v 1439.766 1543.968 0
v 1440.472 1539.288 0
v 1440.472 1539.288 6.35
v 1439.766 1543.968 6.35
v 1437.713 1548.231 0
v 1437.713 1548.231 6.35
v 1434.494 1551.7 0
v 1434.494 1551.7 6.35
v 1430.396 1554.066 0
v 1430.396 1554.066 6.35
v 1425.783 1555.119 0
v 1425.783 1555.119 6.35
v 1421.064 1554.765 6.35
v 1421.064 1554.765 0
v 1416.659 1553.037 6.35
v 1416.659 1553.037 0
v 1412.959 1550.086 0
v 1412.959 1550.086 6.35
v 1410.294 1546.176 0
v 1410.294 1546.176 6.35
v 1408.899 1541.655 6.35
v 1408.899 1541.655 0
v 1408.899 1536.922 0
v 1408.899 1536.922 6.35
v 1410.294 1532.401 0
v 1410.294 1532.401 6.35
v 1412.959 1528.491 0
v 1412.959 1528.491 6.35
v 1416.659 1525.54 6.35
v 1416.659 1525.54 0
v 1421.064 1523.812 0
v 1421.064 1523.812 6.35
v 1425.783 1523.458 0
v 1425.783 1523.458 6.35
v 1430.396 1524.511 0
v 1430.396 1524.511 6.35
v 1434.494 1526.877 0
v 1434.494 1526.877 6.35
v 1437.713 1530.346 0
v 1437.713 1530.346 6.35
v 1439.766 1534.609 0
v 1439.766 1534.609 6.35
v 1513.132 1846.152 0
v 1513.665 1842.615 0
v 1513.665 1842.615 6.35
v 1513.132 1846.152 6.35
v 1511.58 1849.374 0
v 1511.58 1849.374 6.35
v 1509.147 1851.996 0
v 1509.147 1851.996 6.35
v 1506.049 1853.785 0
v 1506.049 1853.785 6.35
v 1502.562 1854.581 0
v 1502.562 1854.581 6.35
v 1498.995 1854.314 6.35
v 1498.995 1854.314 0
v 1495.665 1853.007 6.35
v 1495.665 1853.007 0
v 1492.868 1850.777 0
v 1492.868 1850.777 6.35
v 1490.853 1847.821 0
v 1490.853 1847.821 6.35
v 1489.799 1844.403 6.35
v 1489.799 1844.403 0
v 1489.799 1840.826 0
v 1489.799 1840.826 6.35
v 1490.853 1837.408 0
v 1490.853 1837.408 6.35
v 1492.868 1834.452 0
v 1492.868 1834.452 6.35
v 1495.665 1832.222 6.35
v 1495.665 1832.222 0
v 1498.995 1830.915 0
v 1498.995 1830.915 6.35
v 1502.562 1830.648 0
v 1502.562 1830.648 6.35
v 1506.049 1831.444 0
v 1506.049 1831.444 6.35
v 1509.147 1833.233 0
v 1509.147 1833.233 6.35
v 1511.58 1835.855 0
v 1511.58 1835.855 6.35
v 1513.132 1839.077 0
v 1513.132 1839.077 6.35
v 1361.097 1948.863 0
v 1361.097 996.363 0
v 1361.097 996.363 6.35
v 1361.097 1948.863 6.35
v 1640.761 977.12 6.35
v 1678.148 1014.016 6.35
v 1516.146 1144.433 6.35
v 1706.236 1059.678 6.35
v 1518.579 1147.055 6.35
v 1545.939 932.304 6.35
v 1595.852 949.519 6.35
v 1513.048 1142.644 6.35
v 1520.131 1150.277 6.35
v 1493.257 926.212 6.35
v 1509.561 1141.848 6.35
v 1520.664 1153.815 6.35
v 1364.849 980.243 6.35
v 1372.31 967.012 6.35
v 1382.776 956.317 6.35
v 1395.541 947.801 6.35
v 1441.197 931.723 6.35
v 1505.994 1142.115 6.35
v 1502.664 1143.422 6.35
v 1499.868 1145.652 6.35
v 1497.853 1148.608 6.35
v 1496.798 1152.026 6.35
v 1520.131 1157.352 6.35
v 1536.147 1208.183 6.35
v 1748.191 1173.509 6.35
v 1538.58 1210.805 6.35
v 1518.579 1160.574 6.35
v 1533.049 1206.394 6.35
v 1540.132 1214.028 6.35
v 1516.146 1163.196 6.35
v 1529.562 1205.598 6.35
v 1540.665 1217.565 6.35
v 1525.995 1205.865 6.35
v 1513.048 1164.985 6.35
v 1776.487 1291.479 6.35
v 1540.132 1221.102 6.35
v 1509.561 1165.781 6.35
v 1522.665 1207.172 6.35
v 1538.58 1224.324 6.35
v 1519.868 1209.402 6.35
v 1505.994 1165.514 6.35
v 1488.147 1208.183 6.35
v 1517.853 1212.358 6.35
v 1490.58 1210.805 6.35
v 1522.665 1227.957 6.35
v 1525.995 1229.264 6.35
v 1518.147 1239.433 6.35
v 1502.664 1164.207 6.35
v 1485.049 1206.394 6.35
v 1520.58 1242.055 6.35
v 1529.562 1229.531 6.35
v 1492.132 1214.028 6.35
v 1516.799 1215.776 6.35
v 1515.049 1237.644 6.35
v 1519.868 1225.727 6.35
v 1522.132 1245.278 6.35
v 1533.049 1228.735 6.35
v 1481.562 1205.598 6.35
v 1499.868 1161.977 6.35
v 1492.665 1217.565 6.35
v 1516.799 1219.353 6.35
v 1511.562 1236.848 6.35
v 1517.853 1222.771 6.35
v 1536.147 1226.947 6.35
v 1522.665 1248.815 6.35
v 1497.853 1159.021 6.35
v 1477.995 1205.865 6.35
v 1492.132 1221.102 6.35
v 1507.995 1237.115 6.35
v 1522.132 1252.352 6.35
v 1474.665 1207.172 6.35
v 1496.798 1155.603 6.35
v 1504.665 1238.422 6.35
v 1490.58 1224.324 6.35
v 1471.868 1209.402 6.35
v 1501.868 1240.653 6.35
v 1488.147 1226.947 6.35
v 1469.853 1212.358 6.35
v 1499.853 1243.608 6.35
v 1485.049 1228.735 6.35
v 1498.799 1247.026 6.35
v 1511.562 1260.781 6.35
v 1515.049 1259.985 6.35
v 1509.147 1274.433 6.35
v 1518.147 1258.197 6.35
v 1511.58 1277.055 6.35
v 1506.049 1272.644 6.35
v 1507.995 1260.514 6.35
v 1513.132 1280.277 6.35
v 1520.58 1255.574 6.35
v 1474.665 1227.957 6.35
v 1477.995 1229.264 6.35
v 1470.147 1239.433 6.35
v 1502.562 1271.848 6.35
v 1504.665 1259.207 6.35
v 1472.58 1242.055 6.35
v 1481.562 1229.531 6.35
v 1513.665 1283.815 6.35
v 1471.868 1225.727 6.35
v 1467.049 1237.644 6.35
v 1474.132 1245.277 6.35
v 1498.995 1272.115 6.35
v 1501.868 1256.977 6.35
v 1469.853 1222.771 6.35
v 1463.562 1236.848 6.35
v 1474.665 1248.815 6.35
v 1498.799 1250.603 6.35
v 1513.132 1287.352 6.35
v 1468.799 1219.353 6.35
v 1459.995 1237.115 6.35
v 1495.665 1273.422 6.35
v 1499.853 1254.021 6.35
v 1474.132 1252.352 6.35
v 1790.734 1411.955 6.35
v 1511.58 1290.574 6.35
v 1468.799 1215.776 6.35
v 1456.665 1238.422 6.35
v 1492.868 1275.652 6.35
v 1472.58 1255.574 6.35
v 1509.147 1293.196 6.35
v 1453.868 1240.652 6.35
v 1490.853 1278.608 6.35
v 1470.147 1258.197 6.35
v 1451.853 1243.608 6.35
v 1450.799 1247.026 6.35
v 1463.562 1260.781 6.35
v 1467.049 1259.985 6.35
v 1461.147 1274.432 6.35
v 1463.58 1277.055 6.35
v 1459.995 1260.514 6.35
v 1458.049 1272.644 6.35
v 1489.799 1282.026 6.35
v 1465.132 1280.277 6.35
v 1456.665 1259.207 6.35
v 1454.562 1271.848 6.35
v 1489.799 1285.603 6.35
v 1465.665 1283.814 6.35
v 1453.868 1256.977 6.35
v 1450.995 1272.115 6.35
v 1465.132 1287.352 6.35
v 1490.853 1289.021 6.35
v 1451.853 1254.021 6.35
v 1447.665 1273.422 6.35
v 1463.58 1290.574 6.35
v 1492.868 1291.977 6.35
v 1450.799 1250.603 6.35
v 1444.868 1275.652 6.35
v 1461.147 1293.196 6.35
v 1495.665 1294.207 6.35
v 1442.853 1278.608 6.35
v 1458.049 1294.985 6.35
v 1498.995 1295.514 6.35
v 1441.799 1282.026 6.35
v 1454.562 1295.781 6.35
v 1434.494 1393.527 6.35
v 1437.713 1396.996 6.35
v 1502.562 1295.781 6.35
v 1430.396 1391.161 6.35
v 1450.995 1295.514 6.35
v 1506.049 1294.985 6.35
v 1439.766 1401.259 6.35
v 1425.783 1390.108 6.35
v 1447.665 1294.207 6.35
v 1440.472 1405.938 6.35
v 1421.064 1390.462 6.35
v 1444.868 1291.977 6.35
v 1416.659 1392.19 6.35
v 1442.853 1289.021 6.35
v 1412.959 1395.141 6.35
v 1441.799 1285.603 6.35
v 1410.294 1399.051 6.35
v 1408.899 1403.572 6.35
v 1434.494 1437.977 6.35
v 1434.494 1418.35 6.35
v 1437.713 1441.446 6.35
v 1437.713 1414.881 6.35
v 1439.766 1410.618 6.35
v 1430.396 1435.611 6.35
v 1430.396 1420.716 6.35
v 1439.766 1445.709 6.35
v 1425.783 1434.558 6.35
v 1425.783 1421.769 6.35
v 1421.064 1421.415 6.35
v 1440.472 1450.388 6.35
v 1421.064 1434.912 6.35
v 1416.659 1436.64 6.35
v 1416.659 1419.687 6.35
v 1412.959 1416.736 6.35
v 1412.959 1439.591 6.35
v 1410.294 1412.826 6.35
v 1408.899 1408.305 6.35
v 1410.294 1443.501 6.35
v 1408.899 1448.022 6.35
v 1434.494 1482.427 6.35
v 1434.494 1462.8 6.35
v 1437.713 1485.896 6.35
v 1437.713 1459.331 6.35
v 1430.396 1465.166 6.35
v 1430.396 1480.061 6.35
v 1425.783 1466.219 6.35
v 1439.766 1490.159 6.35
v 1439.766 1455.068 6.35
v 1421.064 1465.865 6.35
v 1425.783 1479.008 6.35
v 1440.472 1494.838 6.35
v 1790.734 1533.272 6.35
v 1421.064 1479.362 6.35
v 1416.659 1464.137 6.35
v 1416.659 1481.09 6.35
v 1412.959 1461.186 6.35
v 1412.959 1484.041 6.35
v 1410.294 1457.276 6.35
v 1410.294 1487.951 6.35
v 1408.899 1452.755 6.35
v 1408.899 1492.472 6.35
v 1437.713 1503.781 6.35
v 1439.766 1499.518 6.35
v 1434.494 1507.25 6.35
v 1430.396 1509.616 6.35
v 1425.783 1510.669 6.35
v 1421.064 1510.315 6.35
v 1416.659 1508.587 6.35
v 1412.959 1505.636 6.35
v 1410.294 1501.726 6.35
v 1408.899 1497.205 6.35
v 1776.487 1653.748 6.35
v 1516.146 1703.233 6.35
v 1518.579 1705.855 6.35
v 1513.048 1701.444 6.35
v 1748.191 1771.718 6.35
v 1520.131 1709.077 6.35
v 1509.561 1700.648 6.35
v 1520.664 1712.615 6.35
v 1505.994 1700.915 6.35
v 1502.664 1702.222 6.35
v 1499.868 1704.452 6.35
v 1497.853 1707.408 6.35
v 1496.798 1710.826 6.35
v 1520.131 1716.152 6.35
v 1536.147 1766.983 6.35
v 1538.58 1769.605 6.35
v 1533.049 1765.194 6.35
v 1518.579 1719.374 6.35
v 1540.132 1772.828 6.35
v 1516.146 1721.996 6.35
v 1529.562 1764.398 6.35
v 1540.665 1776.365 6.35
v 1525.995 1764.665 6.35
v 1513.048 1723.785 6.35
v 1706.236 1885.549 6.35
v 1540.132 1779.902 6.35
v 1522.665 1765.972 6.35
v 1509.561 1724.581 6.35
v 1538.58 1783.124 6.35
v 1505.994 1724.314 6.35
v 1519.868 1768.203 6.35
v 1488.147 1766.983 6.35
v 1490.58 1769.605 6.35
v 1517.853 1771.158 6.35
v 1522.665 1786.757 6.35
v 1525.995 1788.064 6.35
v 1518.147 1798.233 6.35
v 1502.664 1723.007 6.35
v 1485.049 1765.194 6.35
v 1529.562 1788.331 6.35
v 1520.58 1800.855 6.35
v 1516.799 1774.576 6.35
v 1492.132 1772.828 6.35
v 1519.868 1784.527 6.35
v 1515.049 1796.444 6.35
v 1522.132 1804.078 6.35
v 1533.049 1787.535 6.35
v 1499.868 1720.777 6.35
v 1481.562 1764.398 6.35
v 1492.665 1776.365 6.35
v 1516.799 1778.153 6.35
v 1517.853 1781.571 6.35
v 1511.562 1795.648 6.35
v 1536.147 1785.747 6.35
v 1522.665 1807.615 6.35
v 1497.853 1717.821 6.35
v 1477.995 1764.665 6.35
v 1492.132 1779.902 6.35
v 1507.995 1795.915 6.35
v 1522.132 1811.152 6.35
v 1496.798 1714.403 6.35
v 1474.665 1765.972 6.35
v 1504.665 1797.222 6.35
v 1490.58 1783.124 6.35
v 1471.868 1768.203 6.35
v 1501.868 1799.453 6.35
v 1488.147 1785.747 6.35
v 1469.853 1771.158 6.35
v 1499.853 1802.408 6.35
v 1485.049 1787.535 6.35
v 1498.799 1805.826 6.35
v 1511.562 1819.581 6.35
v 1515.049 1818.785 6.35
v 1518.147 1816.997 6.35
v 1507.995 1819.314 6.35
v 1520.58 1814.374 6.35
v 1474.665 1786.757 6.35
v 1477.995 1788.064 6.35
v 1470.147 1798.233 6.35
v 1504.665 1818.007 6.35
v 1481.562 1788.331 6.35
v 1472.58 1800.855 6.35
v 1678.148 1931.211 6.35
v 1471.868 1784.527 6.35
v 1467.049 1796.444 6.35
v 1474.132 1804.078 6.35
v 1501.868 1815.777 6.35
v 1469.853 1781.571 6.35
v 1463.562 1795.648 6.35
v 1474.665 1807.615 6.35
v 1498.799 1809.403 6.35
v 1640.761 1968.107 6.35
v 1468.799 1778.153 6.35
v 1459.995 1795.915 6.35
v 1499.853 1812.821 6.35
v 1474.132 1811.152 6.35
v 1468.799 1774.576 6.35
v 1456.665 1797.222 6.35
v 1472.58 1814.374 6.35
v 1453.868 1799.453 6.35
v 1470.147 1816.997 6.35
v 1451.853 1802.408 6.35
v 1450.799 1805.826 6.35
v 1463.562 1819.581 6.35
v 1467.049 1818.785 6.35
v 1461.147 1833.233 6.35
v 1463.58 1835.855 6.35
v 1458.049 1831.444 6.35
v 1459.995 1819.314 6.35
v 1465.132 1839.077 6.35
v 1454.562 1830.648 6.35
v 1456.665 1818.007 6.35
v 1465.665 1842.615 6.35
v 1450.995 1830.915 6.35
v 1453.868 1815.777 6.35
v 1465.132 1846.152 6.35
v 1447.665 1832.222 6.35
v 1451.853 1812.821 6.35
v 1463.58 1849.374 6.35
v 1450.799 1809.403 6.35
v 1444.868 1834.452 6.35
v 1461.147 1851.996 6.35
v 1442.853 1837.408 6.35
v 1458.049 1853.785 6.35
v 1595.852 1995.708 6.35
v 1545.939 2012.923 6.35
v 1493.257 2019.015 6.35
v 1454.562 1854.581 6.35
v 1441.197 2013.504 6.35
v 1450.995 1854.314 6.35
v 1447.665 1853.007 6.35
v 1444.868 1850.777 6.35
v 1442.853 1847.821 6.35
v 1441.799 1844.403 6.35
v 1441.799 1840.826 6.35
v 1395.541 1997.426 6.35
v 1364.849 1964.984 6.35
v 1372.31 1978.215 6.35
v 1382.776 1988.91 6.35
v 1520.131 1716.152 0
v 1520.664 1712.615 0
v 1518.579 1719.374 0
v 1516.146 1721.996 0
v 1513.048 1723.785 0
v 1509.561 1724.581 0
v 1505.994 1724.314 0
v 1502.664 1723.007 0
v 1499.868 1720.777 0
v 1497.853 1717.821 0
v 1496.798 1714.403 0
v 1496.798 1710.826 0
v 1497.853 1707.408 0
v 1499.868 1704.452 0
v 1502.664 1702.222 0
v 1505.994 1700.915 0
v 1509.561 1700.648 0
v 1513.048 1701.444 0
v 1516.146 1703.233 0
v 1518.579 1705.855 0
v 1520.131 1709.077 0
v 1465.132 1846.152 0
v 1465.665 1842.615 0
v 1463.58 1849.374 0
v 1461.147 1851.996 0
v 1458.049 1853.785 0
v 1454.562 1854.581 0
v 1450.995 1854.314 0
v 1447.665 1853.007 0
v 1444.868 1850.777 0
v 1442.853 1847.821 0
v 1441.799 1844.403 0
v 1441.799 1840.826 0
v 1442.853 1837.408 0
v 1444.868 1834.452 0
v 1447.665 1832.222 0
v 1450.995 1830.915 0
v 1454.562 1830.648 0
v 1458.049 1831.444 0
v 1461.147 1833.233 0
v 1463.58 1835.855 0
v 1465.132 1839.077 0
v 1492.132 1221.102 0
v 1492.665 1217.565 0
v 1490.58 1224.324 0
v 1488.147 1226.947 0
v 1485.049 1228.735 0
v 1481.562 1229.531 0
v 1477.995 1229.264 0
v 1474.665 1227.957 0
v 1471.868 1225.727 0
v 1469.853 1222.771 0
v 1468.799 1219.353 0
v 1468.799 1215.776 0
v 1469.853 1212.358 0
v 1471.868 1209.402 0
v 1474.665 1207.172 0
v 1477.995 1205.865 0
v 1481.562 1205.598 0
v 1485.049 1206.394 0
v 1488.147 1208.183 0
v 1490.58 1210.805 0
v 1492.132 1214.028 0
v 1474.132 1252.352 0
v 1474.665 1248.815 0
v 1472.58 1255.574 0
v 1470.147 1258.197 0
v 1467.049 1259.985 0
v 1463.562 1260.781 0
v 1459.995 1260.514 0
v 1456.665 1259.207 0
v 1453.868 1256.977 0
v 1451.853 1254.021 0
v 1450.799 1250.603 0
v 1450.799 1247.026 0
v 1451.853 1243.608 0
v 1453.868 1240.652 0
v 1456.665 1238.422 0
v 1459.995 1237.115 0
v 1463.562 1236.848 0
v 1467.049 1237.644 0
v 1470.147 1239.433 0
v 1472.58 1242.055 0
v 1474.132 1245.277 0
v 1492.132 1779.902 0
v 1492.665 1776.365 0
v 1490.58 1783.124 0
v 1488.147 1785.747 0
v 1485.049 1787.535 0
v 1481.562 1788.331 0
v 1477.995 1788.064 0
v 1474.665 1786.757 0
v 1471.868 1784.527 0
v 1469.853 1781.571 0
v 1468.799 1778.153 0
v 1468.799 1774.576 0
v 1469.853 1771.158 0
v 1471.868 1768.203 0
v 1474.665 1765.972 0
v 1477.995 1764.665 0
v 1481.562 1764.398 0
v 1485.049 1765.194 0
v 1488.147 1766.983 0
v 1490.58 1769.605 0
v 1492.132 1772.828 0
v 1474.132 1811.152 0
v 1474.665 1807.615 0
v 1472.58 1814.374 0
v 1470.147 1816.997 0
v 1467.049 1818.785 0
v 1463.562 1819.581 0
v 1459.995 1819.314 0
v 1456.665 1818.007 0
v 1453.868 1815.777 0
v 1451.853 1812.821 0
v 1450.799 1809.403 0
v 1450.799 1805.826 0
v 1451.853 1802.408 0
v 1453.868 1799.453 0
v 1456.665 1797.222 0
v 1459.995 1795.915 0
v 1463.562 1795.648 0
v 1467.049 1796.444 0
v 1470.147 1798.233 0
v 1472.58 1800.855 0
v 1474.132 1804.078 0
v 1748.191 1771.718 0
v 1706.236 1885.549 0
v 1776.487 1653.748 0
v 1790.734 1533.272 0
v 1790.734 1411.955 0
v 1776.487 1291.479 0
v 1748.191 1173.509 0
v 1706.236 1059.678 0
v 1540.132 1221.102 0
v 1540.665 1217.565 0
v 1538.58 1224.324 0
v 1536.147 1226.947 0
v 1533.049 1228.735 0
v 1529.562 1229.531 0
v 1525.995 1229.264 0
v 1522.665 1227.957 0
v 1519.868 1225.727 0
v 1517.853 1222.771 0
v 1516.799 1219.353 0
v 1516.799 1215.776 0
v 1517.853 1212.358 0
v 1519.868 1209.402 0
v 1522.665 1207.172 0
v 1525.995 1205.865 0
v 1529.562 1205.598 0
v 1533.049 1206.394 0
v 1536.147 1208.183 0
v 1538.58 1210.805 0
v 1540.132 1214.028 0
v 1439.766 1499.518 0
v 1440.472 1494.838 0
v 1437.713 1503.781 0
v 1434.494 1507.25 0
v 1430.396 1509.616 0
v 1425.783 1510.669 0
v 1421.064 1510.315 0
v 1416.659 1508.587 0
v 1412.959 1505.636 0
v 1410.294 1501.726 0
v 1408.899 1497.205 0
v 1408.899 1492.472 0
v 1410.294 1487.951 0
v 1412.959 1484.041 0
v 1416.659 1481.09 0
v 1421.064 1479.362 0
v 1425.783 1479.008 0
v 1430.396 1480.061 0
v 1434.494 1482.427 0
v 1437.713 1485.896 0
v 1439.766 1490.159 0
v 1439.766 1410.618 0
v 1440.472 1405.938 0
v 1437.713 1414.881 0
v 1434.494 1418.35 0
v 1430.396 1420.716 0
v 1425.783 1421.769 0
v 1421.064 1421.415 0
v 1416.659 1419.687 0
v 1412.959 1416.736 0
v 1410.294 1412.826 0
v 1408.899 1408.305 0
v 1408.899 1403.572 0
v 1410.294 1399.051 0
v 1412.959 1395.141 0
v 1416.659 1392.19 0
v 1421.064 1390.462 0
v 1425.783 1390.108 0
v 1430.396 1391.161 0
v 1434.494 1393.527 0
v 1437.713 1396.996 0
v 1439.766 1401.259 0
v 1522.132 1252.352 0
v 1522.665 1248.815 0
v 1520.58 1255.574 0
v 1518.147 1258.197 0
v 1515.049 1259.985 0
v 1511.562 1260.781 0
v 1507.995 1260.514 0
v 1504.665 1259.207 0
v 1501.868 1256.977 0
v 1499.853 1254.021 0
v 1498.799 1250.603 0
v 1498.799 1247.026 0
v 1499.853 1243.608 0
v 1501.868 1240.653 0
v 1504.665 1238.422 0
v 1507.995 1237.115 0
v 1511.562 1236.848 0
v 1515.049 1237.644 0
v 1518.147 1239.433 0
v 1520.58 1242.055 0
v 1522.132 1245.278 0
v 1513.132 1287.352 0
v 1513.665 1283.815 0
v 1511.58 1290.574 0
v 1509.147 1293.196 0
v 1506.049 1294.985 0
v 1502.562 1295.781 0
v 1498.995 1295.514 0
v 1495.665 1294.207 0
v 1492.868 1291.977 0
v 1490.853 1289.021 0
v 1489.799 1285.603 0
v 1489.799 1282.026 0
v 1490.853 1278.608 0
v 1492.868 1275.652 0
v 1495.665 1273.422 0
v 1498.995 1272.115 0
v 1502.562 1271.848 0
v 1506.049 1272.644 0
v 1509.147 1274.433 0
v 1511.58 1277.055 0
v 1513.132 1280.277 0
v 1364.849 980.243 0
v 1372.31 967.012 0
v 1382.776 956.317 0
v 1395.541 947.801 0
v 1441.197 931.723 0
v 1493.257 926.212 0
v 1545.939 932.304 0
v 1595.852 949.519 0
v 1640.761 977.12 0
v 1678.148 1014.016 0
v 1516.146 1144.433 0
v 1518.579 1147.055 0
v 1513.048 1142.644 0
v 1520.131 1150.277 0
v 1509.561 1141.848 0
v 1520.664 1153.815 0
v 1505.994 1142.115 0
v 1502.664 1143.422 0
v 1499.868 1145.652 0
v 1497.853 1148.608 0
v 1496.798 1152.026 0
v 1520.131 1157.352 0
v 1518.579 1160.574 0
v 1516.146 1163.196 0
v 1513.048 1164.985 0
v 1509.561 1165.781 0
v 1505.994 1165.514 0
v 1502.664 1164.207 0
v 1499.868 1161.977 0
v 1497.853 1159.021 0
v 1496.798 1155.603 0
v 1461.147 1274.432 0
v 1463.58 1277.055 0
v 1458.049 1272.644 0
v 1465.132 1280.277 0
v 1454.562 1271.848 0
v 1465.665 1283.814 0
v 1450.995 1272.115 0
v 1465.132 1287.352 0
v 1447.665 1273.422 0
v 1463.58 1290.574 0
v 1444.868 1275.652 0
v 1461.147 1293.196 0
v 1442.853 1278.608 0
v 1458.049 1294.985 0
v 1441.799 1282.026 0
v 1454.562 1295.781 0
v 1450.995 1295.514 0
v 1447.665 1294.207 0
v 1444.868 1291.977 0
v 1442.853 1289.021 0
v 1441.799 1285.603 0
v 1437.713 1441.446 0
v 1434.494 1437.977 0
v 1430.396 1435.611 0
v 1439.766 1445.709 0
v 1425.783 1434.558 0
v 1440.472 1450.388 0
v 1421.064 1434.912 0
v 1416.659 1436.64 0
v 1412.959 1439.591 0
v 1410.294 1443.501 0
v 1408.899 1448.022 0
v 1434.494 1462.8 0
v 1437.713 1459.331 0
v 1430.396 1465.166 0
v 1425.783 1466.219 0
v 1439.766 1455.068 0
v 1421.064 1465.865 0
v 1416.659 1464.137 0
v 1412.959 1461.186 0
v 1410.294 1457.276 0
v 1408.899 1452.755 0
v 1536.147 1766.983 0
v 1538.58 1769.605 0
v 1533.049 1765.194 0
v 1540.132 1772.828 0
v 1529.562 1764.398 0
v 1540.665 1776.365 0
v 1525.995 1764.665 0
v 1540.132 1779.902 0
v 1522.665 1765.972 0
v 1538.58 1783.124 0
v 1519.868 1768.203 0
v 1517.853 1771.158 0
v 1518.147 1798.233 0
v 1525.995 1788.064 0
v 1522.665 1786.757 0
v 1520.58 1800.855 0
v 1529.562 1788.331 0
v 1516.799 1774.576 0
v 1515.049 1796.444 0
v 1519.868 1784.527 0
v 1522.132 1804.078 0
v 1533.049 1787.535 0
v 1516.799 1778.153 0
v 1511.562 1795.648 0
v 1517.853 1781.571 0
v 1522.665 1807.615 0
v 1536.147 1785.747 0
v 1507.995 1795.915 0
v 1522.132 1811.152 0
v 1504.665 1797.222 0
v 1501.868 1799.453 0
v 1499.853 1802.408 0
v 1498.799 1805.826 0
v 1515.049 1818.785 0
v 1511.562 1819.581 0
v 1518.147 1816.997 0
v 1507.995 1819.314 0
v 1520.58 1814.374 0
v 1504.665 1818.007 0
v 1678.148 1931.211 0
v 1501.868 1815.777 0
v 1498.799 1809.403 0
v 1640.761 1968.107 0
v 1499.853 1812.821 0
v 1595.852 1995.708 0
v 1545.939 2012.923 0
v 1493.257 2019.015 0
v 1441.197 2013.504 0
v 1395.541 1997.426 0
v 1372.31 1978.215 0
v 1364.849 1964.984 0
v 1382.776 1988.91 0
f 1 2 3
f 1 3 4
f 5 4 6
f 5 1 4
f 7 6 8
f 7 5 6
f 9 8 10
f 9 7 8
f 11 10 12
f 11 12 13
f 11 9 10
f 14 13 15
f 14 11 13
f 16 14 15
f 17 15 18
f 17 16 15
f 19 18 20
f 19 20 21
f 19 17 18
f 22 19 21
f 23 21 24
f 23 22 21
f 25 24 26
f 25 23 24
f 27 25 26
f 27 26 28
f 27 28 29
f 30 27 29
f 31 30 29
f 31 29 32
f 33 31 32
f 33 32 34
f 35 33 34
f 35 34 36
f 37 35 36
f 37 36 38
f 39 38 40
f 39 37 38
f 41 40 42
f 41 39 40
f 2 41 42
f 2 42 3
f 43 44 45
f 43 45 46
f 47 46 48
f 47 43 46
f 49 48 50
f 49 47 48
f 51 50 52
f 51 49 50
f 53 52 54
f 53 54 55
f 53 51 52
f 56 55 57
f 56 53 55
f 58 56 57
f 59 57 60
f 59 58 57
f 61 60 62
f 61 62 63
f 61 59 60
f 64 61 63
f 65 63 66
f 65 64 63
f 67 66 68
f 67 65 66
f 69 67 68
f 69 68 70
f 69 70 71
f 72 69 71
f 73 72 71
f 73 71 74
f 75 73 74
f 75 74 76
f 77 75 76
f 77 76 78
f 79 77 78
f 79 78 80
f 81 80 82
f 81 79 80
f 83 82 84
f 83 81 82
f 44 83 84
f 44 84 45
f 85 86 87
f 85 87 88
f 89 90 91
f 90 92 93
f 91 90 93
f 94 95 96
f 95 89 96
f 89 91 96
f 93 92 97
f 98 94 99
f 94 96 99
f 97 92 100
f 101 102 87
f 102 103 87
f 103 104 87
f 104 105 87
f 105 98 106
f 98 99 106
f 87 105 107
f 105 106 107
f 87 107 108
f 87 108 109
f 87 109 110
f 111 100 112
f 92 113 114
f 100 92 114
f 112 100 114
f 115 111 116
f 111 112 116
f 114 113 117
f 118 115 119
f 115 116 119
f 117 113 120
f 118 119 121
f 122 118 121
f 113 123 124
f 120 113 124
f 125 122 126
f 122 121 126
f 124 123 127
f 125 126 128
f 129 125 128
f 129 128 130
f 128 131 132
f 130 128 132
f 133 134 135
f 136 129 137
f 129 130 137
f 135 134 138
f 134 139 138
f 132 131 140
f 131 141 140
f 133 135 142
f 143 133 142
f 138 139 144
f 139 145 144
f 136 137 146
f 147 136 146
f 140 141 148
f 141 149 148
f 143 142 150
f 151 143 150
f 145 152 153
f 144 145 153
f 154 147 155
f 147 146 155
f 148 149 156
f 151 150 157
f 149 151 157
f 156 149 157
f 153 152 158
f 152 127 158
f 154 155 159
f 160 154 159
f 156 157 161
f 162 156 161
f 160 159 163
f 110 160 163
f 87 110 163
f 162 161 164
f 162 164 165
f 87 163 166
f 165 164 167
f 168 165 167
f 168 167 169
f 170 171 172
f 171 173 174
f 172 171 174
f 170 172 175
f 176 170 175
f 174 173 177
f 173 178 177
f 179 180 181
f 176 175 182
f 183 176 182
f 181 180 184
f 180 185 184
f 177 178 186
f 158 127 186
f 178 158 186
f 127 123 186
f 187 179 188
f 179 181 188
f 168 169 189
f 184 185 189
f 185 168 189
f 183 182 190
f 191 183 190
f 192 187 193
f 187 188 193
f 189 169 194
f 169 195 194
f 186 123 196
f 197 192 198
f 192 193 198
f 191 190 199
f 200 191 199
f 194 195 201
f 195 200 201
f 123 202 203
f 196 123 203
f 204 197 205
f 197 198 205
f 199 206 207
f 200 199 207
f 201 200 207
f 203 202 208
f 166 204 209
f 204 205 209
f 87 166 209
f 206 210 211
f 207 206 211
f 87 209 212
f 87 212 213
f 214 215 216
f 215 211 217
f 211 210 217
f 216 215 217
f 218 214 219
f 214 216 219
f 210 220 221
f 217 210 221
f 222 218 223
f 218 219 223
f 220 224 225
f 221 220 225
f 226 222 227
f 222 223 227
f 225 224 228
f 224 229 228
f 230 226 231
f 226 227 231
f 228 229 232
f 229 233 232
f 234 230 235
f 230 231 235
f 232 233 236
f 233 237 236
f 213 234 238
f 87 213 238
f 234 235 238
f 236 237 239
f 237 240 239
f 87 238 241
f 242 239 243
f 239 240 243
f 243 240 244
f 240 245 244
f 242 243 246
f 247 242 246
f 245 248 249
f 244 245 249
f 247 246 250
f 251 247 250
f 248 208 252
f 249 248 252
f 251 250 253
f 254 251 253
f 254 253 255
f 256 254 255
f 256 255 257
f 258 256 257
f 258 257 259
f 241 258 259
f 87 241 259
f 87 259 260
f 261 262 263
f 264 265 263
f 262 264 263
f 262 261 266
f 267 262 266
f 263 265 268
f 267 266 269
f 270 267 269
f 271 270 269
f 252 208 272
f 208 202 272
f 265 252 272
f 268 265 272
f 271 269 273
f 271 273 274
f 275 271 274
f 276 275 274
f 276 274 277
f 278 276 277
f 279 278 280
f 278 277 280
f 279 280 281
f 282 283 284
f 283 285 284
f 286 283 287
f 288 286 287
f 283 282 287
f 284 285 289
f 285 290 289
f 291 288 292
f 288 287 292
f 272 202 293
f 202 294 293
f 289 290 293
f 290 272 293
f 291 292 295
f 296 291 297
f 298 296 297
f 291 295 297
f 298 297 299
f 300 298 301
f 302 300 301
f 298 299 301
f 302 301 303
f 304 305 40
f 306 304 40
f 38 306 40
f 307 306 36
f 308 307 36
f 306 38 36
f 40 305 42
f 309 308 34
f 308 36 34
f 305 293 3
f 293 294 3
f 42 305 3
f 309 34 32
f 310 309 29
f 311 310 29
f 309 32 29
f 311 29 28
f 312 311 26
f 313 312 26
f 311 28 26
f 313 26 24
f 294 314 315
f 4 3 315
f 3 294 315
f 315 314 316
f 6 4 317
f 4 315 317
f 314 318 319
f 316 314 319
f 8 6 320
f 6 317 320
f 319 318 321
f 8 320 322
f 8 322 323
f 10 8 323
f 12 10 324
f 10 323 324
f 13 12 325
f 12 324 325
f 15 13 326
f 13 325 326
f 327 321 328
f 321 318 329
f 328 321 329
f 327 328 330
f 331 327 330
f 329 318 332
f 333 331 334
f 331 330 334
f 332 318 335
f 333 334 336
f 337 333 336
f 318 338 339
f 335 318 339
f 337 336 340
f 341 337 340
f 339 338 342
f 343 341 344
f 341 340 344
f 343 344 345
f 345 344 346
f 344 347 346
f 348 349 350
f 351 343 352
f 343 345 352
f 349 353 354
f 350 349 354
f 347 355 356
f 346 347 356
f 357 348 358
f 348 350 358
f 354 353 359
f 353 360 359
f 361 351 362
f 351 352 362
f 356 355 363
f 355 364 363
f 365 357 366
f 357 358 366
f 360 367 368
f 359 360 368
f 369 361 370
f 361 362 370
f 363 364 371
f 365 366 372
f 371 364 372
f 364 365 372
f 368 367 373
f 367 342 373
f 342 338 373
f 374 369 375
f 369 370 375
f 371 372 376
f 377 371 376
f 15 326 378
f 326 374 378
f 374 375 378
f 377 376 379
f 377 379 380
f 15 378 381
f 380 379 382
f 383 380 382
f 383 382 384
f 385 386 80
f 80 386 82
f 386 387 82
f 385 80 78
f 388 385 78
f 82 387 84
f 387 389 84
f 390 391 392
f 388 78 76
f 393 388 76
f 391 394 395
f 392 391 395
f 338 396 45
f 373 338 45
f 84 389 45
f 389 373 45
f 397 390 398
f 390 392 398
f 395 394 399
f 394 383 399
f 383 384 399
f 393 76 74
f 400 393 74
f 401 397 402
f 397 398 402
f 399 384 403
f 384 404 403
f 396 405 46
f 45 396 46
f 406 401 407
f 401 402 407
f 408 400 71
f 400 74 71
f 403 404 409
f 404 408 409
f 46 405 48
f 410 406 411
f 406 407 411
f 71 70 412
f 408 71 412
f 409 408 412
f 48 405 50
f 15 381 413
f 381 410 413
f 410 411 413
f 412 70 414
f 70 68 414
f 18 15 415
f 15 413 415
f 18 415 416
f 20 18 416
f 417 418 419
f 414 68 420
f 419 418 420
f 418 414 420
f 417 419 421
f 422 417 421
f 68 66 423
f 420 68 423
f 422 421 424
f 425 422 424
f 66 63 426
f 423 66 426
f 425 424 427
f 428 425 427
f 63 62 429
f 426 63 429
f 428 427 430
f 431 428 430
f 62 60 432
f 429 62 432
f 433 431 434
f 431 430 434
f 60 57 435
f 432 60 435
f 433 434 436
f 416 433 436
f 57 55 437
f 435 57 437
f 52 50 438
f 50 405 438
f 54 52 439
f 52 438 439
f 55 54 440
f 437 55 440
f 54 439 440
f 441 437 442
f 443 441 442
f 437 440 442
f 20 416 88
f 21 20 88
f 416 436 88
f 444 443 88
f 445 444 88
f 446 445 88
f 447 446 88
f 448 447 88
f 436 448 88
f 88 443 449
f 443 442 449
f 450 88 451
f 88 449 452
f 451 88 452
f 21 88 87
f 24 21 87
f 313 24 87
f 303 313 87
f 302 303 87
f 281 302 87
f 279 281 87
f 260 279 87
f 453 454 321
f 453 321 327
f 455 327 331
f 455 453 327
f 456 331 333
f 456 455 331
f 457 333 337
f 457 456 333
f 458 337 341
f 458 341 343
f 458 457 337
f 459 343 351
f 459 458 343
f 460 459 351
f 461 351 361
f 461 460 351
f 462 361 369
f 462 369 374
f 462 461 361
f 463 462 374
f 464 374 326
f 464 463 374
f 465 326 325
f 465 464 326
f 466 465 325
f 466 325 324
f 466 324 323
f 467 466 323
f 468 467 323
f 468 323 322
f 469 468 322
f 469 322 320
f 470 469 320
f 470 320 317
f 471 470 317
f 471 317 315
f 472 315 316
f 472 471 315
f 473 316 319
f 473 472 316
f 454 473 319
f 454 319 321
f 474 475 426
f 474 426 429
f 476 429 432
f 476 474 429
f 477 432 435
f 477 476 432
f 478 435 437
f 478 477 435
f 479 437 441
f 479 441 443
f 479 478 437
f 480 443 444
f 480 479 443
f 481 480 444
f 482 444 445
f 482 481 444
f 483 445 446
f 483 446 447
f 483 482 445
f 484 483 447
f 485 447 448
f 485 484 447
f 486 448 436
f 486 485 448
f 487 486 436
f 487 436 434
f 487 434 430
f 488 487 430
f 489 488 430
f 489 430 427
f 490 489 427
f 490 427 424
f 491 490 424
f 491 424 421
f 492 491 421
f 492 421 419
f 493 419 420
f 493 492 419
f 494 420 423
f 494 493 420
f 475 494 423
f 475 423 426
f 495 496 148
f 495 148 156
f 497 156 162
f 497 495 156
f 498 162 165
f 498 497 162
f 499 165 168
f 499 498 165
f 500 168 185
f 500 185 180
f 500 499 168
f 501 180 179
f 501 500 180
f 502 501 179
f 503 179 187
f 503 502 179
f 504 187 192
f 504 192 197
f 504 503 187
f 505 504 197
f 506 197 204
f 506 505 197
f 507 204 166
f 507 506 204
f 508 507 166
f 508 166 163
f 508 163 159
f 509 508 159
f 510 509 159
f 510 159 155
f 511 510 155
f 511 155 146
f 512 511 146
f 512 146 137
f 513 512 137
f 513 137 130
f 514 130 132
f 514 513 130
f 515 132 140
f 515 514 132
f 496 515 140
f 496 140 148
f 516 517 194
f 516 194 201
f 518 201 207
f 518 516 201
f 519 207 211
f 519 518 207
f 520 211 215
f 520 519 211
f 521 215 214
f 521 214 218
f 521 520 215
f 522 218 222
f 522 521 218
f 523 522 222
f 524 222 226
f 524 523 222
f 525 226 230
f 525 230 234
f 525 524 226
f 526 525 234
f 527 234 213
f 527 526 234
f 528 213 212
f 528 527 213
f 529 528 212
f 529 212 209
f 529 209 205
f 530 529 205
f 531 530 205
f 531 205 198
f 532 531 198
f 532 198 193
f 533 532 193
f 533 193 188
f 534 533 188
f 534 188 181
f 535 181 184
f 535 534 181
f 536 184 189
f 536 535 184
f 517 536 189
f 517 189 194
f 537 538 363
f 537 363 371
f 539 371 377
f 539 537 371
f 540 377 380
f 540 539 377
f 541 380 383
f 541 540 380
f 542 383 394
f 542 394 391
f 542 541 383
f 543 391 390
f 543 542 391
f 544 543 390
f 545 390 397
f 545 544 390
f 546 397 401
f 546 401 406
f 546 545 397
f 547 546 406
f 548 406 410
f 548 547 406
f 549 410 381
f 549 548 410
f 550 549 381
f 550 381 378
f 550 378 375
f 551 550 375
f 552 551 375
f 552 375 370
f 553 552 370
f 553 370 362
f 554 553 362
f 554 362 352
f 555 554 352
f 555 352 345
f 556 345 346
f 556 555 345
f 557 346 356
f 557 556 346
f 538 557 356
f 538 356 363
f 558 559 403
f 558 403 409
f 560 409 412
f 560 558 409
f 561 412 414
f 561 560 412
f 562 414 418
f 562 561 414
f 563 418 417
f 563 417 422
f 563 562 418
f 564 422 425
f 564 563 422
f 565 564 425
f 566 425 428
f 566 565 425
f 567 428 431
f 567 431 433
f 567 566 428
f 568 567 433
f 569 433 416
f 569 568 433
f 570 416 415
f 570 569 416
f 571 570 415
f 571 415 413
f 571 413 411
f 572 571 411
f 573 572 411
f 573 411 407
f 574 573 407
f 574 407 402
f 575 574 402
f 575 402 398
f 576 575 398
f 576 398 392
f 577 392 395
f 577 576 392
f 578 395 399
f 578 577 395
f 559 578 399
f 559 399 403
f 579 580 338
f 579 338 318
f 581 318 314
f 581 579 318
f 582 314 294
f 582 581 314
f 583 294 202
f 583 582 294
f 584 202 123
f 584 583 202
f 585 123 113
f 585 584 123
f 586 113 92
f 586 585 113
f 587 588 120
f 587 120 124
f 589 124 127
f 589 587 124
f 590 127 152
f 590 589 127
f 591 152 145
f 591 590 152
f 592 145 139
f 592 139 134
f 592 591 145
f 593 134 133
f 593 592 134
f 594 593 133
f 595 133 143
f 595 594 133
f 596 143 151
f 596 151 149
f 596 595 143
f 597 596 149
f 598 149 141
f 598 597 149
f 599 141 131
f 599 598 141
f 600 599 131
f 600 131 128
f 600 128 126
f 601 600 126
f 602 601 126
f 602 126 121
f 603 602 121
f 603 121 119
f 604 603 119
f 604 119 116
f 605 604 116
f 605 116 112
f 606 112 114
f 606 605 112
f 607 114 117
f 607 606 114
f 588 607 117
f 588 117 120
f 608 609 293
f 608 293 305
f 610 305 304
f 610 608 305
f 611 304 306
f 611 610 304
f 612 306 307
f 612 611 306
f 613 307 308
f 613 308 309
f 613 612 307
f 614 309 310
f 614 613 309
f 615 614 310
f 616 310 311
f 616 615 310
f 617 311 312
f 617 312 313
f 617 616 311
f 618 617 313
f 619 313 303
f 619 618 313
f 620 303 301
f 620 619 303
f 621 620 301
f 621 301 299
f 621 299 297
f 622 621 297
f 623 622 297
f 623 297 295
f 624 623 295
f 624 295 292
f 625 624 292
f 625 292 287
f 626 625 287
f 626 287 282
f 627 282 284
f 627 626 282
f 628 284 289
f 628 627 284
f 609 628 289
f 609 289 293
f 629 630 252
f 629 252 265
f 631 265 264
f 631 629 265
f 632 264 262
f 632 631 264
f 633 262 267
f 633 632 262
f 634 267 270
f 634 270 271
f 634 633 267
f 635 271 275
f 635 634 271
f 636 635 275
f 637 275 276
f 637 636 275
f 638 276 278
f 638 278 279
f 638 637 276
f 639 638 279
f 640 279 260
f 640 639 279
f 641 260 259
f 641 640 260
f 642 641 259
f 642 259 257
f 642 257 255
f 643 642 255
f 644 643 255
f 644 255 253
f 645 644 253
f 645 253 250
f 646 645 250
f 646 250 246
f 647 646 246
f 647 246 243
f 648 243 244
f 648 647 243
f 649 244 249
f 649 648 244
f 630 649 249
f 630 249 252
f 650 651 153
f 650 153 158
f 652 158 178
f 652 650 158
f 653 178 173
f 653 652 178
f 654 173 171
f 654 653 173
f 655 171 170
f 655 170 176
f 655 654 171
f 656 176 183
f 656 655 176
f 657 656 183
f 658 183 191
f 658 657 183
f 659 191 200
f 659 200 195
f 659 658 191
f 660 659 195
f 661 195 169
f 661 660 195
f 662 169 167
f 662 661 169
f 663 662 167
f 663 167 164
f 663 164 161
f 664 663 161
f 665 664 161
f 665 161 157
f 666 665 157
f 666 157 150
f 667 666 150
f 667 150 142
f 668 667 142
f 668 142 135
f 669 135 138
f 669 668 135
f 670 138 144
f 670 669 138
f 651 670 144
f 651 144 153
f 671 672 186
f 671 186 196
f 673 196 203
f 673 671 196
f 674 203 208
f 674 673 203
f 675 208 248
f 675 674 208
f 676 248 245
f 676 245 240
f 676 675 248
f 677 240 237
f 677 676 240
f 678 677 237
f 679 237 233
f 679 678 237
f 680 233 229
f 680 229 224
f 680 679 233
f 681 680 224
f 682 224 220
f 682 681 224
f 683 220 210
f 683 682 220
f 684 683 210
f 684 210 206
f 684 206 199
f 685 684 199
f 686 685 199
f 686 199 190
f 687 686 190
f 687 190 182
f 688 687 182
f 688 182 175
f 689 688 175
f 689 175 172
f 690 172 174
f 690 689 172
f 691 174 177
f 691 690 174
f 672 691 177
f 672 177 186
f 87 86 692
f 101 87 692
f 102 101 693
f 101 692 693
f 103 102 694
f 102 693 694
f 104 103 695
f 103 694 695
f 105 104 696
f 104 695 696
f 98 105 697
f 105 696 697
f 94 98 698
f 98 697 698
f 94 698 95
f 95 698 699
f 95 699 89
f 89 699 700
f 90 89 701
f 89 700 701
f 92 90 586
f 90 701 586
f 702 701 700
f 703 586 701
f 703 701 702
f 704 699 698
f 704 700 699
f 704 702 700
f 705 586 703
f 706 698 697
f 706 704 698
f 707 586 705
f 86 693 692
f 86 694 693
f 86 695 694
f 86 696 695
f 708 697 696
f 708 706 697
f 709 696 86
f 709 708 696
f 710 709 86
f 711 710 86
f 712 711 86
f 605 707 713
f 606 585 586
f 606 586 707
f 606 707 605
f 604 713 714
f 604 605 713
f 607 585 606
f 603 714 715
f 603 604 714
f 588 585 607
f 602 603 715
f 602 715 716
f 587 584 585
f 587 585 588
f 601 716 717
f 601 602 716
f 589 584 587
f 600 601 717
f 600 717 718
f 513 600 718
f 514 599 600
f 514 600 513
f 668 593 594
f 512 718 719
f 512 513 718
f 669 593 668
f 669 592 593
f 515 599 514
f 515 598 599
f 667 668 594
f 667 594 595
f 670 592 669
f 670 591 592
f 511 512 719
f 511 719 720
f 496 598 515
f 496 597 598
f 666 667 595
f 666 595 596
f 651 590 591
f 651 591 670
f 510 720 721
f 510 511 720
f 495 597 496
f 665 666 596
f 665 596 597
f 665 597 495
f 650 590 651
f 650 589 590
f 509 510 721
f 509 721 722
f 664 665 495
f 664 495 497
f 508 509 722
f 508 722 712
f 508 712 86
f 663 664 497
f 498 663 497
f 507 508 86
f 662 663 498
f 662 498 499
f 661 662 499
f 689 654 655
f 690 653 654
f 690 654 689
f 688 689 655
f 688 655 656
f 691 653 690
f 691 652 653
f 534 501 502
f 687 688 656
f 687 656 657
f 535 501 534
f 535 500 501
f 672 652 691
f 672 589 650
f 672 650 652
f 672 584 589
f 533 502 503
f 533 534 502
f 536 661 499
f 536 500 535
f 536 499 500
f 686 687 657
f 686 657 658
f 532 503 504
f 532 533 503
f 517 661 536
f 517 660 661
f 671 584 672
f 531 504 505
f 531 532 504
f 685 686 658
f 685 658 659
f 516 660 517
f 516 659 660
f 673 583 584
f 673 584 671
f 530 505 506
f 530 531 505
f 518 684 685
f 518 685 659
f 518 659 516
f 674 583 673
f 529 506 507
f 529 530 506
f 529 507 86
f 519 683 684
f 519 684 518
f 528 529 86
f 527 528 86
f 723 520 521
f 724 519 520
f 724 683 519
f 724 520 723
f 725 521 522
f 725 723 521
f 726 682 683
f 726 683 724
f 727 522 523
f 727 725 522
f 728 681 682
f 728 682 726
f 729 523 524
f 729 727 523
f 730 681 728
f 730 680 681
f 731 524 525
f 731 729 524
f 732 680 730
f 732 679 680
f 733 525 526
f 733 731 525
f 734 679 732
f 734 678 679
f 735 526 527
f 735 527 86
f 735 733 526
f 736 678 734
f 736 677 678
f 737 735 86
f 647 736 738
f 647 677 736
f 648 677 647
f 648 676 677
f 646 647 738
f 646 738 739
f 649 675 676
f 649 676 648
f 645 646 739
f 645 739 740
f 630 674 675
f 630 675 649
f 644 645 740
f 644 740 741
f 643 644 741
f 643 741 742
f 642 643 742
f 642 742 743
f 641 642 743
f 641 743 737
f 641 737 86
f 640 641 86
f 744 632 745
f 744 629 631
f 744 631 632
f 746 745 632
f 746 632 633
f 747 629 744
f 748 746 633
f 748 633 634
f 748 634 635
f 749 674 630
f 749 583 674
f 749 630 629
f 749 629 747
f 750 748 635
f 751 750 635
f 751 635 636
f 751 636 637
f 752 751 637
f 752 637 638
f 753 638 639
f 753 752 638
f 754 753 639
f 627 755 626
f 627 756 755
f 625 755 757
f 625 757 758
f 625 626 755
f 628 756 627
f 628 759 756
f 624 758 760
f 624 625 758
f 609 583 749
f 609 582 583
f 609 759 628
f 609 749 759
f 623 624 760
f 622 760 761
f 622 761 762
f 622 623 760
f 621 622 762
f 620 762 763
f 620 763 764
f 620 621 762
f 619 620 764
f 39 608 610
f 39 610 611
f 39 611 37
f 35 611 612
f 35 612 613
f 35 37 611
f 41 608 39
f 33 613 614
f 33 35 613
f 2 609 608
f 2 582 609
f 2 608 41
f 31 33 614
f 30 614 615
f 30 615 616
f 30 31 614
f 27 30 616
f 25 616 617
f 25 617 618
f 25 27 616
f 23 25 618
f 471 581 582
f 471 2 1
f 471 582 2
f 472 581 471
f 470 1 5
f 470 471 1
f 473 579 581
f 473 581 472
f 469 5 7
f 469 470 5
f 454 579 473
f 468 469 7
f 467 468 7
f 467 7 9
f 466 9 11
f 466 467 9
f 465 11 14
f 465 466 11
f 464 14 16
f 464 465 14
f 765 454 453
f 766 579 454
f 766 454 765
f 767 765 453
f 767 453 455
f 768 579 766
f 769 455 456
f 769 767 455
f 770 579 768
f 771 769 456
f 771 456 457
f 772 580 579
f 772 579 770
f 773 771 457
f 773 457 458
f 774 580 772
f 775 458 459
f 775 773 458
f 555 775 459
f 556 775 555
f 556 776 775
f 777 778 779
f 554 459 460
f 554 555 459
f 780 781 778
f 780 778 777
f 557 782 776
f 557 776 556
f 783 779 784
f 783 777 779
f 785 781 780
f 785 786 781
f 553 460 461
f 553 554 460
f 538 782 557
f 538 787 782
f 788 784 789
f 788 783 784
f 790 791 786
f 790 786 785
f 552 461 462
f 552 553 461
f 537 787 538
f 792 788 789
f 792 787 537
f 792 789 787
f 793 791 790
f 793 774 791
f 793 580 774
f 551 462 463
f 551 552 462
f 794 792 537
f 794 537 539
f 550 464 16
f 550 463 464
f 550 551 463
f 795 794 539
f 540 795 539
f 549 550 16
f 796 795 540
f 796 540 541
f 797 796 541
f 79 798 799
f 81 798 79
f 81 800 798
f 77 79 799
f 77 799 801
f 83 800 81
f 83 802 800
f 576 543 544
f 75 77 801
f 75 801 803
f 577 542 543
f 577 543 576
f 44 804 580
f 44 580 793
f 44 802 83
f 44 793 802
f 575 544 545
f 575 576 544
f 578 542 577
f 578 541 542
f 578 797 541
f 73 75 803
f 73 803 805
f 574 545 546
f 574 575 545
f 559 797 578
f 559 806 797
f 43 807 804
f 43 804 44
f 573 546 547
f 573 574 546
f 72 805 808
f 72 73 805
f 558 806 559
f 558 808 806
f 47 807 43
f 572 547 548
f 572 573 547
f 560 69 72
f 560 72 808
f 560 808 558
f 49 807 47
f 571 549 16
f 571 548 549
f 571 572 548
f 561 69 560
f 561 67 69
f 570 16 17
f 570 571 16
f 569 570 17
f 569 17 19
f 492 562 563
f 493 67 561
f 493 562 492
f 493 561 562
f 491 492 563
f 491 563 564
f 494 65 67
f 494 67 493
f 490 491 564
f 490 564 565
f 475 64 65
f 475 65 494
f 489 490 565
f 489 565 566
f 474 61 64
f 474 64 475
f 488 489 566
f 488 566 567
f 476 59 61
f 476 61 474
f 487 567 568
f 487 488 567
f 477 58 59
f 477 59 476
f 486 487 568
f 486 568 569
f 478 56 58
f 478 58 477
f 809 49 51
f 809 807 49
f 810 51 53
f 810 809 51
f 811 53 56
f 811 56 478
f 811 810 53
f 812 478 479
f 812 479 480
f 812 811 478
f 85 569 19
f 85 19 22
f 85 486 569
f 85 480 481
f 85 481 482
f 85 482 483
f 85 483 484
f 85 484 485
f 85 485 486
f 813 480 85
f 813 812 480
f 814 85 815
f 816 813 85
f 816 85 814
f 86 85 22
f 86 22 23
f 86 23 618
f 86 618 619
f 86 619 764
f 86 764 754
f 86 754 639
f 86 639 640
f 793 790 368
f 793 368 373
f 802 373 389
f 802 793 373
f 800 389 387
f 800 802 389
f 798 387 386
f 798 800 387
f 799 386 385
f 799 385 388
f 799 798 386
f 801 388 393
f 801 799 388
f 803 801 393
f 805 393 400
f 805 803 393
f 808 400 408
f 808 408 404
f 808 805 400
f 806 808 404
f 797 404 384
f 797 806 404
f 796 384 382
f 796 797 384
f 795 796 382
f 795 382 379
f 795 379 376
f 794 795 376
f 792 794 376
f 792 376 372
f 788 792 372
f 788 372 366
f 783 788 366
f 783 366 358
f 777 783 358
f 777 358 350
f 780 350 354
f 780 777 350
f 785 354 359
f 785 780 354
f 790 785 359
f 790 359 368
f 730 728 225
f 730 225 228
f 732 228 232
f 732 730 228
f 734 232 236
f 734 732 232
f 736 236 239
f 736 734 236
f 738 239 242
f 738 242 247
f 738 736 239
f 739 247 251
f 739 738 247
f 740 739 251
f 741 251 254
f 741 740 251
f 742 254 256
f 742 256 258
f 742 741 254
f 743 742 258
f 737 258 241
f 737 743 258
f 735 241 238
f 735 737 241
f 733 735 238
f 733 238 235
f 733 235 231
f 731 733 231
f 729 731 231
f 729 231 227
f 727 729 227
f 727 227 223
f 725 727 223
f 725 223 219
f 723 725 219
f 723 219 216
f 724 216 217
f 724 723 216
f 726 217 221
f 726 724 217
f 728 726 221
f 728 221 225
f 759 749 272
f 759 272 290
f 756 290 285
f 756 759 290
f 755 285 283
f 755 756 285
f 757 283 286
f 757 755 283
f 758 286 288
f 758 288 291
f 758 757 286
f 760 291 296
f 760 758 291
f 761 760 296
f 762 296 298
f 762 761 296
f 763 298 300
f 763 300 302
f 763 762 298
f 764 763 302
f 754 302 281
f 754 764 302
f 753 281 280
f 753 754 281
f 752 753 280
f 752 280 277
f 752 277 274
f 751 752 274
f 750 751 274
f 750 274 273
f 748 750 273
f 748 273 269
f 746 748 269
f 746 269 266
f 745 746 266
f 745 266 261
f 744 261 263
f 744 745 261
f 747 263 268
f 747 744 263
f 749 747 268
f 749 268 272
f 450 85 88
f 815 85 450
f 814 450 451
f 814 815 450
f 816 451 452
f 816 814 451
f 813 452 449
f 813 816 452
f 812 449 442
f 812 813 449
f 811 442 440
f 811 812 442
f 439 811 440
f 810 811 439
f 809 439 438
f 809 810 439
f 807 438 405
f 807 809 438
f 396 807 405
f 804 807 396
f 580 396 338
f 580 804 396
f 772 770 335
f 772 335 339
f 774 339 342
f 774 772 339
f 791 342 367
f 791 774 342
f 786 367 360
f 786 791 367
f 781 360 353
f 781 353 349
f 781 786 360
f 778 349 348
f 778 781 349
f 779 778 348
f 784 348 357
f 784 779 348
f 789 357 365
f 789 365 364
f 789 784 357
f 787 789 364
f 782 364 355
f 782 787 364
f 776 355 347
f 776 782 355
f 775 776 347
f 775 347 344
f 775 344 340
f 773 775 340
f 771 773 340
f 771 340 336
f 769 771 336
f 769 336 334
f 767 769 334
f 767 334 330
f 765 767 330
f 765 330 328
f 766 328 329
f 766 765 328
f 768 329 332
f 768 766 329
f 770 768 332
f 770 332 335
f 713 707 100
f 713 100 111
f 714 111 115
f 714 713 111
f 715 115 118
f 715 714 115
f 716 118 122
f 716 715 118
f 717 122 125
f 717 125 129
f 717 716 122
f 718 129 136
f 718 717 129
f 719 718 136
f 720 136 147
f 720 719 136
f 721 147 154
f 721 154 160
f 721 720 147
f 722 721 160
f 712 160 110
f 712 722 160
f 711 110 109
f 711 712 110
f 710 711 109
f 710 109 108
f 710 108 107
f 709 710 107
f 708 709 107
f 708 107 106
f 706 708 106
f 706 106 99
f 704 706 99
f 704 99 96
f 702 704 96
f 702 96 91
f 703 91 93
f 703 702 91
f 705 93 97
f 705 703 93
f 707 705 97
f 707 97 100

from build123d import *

# Parameters (mm, degrees)
SKETCH1_R           = 12.0000014
SKETCH1_R_2         = 11.999960371
SKETCH1_R_3         = 15.875
BOSS_EXTRUDE1_DEPTH = 6.35


with BuildPart() as part:
    # Sketch1 → Boss-Extrude1 (new body)
    with BuildSketch(Plane.XY):
        with BuildLine():
            add(Edge.make_bspline(
                [(1361.096561672, 1948.863494174), (1364.400827848, 1984.023171072), (1498.613211066, 2056.462277252), (1658.30760281, 1990.654880293), (1706.236065024, 1885.549246122)],
                knots=[0, 0, 0, 0, 0.219674411, 1, 1, 1, 1], degree=3))
            ThreePointArc((1706.236065024, 1885.549246122), (1792.519416012, 1472.613494175), (1706.236065024, 1059.677742228))
            add(Edge.make_bspline(
                [(1361.096561672, 996.363494176), (1364.400827848, 961.203817278), (1498.613211066, 888.764711097), (1658.30760281, 954.572108057), (1706.236065024, 1059.677742228)],
                knots=[0, 0, 0, 0, 0.219674411, 1, 1, 1, 1], degree=3))
            Line((1361.096561672, 996.363494176), (1361.096561672, 1948.863494174))
        make_face()
        with Locations((1453.664967726, 1842.614506828)):
            Circle(SKETCH1_R, mode=Mode.SUBTRACT)
        with Locations((1480.66492898, 1776.364555337)):
            Circle(SKETCH1_R_2, mode=Mode.SUBTRACT)
        with Locations((1462.664975126, 1807.614576828)):
            Circle(SKETCH1_R, mode=Mode.SUBTRACT)
        with Locations((1528.664893926, 1776.364575828)):
            Circle(SKETCH1_R, mode=Mode.SUBTRACT)
        with Locations((1510.664904526, 1807.614576828)):
            Circle(SKETCH1_R, mode=Mode.SUBTRACT)
        with Locations((1501.664897126, 1842.614506828)):
            Circle(SKETCH1_R, mode=Mode.SUBTRACT)
        with Locations((1424.596561672, 1405.938494174)):
            Circle(SKETCH1_R_3, mode=Mode.SUBTRACT)
        with Locations((1424.596561672, 1450.388494174)):
            Circle(SKETCH1_R_3, mode=Mode.SUBTRACT)
        with Locations((1424.596561672, 1494.838494174)):
            Circle(SKETCH1_R_3, mode=Mode.SUBTRACT)
        with Locations((1424.596561672, 1539.288494174)):
            Circle(SKETCH1_R_3, mode=Mode.SUBTRACT)
        with Locations((1501.664897126, 1283.814506828)):
            Circle(SKETCH1_R, mode=Mode.SUBTRACT)
        with Locations((1480.664970258, 1217.564562981)):
            Circle(SKETCH1_R, mode=Mode.SUBTRACT)
        with Locations((1528.664901326, 1217.564562981)):
            Circle(SKETCH1_R, mode=Mode.SUBTRACT)
        with Locations((1453.664901229, 1283.814468752)):
            Circle(SKETCH1_R, mode=Mode.SUBTRACT)
        with Locations((1508.664375126, 1712.614512828)):
            Circle(SKETCH1_R, mode=Mode.SUBTRACT)
        with Locations((1508.664375126, 1153.814512828)):
            Circle(SKETCH1_R, mode=Mode.SUBTRACT)
        with Locations((1462.664908629, 1248.814538752)):
            Circle(SKETCH1_R, mode=Mode.SUBTRACT)
        with Locations((1510.664904526, 1248.814576828)):
            Circle(SKETCH1_R, mode=Mode.SUBTRACT)
    extrude(amount=BOSS_EXTRUDE1_DEPTH)


solid = part.part
